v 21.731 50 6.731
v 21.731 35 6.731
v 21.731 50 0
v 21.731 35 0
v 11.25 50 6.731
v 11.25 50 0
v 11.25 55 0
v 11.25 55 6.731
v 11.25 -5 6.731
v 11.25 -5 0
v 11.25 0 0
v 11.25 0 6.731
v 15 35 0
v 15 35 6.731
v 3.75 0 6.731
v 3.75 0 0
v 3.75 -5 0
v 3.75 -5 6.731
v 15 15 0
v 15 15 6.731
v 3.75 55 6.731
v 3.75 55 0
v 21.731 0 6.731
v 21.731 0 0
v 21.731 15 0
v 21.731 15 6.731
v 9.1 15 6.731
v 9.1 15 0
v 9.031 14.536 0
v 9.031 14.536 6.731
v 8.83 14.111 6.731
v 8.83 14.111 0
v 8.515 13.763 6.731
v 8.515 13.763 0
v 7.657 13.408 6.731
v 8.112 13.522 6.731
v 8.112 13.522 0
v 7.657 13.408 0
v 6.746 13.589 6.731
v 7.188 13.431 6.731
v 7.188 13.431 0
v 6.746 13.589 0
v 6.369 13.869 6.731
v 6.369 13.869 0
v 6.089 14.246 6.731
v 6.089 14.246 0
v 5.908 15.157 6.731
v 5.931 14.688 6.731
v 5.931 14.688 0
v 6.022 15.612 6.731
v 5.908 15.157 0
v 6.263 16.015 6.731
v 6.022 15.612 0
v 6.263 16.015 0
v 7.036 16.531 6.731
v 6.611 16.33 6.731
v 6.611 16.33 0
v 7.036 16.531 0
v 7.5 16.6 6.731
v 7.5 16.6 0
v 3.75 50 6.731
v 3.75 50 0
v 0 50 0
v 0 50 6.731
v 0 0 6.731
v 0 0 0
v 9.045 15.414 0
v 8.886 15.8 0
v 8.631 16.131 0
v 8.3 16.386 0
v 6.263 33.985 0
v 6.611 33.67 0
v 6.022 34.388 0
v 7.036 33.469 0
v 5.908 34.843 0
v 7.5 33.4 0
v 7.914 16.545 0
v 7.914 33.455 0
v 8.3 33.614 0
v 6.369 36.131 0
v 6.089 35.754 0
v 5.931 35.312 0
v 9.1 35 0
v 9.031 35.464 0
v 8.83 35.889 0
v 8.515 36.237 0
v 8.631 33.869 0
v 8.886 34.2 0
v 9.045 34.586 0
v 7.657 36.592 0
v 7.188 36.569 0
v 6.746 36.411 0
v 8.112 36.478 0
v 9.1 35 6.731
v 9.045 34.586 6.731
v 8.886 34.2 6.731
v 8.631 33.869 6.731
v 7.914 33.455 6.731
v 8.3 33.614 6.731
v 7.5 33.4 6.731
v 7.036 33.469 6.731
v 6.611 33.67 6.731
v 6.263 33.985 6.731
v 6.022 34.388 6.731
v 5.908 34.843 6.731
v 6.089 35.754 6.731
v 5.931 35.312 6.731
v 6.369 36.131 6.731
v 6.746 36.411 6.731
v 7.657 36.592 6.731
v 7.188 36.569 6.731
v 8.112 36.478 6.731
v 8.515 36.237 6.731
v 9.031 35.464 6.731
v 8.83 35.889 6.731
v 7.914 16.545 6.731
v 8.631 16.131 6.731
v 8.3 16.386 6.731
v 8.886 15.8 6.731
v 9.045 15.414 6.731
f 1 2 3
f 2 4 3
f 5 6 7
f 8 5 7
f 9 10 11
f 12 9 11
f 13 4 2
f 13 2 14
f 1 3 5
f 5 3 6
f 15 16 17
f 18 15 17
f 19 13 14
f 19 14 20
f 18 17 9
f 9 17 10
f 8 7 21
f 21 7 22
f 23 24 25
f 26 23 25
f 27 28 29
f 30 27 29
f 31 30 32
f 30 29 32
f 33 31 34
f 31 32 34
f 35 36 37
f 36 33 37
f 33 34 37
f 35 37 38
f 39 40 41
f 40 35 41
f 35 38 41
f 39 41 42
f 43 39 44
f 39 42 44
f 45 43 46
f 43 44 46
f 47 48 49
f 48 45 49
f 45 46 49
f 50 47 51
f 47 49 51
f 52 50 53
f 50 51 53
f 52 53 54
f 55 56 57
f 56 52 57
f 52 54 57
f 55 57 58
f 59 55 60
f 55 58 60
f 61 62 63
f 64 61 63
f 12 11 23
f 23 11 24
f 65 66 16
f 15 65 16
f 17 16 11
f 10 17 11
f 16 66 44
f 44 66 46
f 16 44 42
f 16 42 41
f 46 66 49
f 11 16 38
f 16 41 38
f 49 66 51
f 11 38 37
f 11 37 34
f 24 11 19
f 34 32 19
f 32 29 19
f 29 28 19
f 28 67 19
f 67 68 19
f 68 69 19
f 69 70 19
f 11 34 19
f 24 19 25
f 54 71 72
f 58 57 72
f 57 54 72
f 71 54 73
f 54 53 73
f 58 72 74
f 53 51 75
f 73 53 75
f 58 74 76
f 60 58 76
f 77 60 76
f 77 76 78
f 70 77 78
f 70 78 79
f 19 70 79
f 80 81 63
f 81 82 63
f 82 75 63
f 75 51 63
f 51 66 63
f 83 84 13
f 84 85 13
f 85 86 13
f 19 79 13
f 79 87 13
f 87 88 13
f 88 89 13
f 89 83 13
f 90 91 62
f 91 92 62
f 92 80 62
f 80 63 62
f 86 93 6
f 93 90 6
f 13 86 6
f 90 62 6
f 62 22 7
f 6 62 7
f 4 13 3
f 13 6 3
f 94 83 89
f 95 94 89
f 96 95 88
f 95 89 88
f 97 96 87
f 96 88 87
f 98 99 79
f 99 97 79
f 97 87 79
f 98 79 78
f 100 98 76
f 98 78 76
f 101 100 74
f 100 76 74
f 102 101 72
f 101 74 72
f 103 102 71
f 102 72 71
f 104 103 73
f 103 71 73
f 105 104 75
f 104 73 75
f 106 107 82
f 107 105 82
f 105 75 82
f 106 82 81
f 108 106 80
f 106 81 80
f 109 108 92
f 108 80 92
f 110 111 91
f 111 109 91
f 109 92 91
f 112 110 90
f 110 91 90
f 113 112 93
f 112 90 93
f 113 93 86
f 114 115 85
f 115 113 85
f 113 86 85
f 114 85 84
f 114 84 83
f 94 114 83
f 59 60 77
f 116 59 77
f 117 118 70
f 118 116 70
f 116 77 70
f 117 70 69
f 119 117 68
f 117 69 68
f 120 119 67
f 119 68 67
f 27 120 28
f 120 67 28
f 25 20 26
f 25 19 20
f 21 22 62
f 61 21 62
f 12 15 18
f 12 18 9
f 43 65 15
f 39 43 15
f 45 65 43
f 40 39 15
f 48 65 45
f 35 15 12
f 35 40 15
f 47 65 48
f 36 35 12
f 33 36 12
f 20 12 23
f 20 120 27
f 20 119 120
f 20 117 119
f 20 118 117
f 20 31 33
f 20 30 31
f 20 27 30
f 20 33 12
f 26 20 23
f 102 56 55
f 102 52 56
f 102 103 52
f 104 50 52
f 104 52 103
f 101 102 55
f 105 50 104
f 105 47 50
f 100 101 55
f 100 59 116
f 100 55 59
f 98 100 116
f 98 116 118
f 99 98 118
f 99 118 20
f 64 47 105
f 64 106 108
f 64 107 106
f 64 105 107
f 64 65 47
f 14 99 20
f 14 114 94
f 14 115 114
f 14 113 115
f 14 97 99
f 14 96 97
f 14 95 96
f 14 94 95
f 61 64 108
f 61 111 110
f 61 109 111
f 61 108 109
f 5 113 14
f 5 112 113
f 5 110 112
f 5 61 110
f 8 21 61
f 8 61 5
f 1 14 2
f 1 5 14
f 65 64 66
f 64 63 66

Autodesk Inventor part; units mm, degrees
ref_plane "YZ Plane" through (0, 0, 0) normal (1, 0, 0) x (0, 1, 0)
ref_plane "XZ Plane" through (0, 0, 0) normal (0, 1, 0) x (-1, 0, 0)
ref_plane "XY Plane" through (0, 0, 0) normal (0, 0, 1) x (1, 0, 0)
sketch "Sketch1" plane through (0, 0, 0) normal (0, 0, 1) x (1, 0, 0)
  line L0 (0, 0) -> (3.75, 0)
  line L1 (3.75, 0) -> (3.75, -5)
  line L2 (3.75, -5) -> (11.25, -5)
  line L3 (11.25, -5) -> (11.25, 0)
  line L4 (11.25, 0) -> (21.731, 0)
  line L5 (21.731, 0) -> (21.731, 50)
  line L6 (21.731, 50) -> (11.25, 50)
  line L7 (11.25, 50) -> (11.25, 55)
  line L8 (11.25, 55) -> (3.75, 55)
  line L9 (3.75, 55) -> (3.75, 50)
  line L10 (3.75, 50) -> (0, 50)
  line L11 (0, 50) -> (0, 0)
  line L12 (21.731, 35) -> (15, 35)
  line L13 (15, 35) -> (15, 15)
  line L14 (15, 15) -> (21.731, 15)
  line L15 (21.731, 15) -> (21.731, 35)
  circle A0 centre (7.5, 35) radius 1.6
  circle A1 centre (7.5, 15) radius 1.6
  line L16 (7.5, 15) -> (7.5, 35)
  point P0 (21.731, 25)
  point P1 (21.731, 25)
  point P2 (7.5, -5)
  point P3 (7.5, 25)
  point P4 (0, 25)
  dimension "d0" = 50
  dimension "d1" = 3.75
  dimension "d2" = 5
  dimension "d3" = 7.5
  dimension "d4" = 10.481
  dimension "d5" = 6.731
  dimension "d6" = 20
  dimension "d7" = 3.75
  dimension "d10" = 3.2
  dimension "d11" = 20
extrude "Extrusion1" add sketch "Sketch1" along normal blind 6.731 contours L11 L10 L9 L8 L7 L6 L5 L12 L13 L14 L4 L3 L2 L1 L0
equation "\"d4\" = d7 + THICKB"
equation "\"d5\" = THICKB"
equation "\"d7\" = d1"
equation "\"d8\" = THICKB"
equation "\"THICKA\" = 3.175"
equation "\"THICKB\" = 6.731"
equation "\"THICKC\" = 12.7"
equation "\"BALLDIA\" = 12"
equation "\"MAGDIA\" = 9.5"
equation "\"THICKPLY\" = 5"
properties part number "Frame_Lower_Vertical_Plate_A"
